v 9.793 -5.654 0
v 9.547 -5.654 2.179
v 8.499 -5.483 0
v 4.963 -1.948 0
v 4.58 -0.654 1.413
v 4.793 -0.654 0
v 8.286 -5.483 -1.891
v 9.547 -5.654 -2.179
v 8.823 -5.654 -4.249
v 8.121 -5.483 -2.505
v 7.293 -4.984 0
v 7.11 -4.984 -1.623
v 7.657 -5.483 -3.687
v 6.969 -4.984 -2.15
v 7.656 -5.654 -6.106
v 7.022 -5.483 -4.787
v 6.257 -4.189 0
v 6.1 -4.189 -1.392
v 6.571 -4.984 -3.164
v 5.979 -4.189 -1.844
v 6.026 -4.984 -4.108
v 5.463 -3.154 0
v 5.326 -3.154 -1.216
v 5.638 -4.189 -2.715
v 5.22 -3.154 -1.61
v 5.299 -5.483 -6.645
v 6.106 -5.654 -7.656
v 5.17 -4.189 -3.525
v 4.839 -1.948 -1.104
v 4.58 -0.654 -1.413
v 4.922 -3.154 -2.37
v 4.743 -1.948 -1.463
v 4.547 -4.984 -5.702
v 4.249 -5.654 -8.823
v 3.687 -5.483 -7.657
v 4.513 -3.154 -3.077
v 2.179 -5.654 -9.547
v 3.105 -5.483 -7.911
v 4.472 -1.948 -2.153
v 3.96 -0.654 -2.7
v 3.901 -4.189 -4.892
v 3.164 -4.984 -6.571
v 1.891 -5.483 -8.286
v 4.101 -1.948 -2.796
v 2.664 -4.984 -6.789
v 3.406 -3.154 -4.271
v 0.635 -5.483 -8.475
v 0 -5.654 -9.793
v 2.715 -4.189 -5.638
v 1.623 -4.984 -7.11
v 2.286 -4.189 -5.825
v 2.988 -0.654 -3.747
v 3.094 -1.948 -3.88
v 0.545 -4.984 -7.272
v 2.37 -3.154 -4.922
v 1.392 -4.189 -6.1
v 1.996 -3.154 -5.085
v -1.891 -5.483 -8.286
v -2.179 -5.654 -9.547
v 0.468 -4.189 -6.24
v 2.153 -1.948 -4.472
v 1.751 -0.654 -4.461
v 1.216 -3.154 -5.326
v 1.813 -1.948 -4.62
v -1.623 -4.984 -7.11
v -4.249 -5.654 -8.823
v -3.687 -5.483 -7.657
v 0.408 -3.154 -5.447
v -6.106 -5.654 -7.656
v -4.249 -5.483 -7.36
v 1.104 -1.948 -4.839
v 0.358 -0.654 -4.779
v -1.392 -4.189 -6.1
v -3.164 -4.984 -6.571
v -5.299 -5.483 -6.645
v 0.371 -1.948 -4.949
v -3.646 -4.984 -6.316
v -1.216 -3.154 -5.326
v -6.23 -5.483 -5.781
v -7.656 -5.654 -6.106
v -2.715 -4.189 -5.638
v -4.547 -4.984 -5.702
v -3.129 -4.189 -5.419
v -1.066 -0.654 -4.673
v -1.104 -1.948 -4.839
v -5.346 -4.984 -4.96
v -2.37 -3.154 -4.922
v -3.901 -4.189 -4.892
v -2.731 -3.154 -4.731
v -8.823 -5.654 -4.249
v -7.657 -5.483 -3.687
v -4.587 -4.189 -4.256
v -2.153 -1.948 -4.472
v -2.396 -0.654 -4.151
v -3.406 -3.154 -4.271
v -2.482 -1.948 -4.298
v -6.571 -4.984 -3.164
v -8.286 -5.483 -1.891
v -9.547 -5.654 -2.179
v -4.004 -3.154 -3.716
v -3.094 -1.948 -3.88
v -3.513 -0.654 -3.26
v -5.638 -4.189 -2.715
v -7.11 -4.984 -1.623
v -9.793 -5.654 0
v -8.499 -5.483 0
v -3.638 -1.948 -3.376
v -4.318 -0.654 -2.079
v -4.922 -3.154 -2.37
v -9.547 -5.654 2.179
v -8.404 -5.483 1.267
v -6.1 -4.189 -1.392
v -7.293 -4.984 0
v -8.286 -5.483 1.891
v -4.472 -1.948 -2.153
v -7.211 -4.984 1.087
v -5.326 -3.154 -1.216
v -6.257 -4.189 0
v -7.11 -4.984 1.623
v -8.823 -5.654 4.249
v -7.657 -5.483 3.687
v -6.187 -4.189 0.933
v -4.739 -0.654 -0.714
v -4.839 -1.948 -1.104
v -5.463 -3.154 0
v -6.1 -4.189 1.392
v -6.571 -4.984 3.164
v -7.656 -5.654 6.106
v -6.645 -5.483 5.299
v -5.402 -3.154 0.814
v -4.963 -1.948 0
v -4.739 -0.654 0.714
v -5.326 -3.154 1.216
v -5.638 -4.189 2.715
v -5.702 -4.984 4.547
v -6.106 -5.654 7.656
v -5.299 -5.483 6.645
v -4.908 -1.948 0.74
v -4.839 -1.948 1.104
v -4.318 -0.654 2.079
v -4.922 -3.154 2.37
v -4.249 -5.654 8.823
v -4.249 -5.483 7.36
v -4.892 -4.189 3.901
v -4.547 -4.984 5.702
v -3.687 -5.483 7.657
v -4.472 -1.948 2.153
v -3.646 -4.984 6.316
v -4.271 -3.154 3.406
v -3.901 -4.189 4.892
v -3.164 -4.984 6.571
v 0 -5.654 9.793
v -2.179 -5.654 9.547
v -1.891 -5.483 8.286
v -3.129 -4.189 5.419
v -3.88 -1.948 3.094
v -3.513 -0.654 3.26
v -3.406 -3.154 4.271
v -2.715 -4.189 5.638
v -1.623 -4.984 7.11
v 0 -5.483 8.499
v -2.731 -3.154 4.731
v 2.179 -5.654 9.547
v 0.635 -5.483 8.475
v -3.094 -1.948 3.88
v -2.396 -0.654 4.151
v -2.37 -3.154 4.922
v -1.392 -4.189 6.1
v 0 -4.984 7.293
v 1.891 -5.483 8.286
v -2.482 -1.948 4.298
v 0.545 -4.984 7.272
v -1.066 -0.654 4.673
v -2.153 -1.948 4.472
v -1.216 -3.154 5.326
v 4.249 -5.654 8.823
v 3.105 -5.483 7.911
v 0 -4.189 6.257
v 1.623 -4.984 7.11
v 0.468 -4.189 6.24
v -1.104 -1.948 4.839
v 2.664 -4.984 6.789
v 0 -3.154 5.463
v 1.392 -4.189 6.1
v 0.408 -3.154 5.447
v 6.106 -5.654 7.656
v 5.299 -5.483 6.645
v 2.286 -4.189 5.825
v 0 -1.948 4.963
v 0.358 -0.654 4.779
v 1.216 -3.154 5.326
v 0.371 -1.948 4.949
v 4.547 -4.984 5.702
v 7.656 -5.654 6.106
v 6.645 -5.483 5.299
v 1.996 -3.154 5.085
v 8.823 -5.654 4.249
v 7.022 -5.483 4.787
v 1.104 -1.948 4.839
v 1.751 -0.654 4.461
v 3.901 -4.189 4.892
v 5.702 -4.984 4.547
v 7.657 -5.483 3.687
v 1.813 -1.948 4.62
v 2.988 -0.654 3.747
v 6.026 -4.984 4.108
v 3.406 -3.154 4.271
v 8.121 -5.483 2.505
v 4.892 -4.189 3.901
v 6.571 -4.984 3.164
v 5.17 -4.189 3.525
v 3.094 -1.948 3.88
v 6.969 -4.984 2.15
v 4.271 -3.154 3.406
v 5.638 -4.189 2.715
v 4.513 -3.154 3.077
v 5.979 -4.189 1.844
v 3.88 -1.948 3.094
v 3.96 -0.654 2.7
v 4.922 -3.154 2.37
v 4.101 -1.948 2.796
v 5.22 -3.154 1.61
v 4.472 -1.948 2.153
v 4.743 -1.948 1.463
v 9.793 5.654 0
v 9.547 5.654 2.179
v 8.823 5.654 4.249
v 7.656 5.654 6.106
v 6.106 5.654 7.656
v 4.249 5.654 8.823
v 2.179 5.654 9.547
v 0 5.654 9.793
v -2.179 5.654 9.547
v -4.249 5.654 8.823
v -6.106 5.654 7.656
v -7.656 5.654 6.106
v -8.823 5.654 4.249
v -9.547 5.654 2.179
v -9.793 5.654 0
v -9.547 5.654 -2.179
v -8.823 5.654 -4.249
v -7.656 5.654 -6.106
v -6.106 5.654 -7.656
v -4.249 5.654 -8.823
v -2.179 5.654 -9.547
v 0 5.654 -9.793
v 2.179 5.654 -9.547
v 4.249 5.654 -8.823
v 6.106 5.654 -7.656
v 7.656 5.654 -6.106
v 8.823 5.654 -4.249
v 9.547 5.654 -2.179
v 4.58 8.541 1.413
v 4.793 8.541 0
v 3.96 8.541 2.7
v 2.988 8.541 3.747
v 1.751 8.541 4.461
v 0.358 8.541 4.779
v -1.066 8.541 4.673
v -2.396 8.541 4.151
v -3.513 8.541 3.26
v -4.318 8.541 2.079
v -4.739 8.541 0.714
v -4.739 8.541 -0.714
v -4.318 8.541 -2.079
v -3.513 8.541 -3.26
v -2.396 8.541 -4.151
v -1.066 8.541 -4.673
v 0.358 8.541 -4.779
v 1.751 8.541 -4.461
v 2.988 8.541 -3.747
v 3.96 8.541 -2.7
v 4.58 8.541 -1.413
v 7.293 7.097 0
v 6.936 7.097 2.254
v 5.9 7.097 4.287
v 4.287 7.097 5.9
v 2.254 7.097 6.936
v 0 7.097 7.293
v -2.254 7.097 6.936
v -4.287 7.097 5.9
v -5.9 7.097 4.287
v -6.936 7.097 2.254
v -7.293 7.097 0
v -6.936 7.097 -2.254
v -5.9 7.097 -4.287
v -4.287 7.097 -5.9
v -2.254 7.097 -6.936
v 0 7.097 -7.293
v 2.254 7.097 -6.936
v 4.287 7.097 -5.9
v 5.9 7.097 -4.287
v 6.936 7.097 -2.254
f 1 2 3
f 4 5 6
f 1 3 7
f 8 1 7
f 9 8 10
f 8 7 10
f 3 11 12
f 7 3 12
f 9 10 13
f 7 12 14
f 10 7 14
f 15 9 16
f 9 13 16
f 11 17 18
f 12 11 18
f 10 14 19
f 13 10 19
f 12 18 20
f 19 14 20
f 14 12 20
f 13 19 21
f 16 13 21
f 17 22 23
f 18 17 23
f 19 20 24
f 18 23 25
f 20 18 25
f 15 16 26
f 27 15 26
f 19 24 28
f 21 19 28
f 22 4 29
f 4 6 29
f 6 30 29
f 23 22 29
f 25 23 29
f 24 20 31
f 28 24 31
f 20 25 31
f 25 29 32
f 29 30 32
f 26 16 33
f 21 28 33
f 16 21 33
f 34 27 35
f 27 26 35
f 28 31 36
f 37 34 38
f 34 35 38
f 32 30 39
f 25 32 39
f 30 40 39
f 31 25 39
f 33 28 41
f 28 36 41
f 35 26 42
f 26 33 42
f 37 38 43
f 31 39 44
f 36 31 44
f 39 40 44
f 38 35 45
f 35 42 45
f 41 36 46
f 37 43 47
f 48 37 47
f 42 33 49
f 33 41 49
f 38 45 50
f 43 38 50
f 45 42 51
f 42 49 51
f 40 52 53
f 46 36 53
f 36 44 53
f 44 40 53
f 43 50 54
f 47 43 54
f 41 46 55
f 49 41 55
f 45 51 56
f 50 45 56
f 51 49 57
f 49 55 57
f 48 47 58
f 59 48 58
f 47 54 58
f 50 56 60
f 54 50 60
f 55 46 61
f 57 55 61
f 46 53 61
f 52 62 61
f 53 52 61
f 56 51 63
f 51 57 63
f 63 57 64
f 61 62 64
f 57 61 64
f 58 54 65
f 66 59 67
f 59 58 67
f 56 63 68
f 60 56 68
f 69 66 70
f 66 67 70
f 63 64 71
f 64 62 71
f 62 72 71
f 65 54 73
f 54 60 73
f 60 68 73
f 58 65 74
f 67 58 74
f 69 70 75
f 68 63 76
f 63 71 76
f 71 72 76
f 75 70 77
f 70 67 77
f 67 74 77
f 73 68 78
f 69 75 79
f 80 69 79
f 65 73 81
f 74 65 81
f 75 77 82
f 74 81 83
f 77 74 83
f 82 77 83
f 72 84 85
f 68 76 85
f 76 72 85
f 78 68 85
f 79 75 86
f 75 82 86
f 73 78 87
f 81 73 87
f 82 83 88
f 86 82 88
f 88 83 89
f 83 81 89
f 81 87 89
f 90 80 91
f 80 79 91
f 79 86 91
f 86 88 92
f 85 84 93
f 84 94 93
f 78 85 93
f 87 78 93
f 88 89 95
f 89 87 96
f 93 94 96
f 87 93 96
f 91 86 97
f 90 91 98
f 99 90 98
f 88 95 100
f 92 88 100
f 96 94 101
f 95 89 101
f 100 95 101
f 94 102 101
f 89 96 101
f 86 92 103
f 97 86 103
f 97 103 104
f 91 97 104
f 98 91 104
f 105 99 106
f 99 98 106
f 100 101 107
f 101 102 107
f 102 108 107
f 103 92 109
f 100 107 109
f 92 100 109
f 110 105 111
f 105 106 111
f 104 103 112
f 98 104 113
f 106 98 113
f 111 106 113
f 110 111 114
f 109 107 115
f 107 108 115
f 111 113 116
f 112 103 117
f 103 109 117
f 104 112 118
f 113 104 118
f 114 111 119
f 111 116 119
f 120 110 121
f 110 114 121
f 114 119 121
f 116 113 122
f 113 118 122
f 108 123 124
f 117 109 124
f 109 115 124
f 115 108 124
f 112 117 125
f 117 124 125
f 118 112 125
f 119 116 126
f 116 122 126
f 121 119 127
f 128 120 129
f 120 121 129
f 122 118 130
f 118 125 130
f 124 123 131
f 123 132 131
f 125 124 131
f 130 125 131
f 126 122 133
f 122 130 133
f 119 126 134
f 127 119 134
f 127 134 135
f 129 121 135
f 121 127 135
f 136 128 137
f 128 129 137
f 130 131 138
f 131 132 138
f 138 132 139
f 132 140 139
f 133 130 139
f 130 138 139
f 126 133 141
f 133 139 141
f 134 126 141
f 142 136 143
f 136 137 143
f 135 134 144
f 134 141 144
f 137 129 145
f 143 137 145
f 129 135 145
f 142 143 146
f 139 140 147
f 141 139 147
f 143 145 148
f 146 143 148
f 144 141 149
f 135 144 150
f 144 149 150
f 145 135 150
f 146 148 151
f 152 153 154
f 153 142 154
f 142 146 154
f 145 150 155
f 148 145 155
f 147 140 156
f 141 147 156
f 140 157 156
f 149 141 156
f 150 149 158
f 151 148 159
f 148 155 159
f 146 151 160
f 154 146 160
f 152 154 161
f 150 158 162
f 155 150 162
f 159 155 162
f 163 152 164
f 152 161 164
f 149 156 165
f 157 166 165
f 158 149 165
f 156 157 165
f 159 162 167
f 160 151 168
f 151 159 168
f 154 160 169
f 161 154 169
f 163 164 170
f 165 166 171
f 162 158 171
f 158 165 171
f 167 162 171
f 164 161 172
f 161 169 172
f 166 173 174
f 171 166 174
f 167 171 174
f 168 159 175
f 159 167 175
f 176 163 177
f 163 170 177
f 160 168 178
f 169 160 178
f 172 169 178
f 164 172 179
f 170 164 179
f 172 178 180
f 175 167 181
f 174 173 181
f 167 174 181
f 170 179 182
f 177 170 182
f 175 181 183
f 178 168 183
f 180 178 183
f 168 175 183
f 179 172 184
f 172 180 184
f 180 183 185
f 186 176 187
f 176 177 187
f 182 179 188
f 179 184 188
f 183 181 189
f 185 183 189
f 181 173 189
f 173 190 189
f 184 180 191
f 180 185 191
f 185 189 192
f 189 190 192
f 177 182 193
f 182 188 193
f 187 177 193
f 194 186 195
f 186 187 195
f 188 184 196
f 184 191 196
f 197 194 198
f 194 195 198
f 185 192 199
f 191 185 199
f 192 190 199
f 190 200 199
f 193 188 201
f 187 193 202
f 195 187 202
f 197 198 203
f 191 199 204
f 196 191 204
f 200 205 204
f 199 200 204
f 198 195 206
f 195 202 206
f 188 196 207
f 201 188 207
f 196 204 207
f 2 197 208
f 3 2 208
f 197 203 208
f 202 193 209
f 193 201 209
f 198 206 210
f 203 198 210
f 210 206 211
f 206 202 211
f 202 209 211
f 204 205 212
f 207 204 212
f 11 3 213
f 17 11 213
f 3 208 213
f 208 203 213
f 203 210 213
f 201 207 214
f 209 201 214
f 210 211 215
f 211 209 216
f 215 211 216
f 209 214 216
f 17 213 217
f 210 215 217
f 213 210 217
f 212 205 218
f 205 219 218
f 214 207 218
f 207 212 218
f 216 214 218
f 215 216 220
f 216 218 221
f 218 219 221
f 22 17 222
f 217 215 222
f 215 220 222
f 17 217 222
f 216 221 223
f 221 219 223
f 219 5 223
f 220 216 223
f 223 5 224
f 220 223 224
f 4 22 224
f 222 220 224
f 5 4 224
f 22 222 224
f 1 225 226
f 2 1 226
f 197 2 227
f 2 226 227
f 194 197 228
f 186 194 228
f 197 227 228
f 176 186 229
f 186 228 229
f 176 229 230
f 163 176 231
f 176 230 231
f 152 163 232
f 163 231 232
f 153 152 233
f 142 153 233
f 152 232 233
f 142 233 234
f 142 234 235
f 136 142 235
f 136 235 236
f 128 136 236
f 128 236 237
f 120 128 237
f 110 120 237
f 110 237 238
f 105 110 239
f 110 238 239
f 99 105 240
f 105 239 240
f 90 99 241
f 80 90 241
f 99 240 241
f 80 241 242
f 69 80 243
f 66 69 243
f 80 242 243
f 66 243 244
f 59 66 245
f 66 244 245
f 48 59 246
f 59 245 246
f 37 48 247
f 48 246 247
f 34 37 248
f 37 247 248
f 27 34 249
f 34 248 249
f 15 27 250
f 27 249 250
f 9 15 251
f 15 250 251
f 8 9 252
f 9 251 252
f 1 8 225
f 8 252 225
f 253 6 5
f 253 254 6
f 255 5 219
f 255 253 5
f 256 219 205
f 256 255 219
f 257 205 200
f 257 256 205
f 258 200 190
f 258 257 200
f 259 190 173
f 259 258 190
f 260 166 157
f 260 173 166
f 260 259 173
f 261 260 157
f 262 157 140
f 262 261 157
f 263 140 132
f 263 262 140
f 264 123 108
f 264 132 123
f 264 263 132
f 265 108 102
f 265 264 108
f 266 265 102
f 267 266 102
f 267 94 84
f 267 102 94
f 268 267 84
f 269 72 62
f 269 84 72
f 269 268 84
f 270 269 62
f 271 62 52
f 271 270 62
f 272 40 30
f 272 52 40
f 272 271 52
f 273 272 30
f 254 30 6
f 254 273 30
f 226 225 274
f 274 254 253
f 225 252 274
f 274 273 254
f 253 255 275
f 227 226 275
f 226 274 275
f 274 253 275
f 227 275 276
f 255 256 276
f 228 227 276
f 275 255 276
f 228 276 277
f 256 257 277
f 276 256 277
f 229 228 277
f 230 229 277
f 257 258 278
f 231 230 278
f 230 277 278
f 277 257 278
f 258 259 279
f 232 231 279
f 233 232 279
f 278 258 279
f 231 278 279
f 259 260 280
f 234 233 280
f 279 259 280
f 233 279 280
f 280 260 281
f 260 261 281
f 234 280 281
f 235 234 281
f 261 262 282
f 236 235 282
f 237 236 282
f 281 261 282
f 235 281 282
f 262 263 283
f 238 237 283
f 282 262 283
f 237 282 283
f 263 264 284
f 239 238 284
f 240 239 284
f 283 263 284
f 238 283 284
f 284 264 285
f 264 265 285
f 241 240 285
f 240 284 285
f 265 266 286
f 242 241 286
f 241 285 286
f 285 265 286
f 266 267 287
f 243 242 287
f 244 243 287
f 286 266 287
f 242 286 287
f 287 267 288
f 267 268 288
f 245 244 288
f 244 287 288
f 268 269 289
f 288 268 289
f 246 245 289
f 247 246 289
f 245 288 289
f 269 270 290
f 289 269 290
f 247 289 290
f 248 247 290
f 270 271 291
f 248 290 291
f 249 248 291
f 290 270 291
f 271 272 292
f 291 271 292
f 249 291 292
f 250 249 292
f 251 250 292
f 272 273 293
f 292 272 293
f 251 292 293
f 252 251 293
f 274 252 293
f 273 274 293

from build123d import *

# Parameters (mm, degrees)
F2_T = -5


# Not quite as in the source:
# - a fillet or chamfer that OpenCascade refuses, or shapes differently, is made with other operations: its cross-section is extruded or revolved along the edge and cut away or added


with BuildPart() as f1:
    # F0 (on Top) → F1 (revolve)
    with BuildSketch(Plane.XY):
        Polygon((0, 11.3076803427), (0, -11.3076803427), (9.7927384347, -5.6538401714), (9.7927384347, 5.6538401714), align=None)
    revolve(axis=Axis((0, 0, 0), (0, -1, 0)))

    # F2
    f2_openings = [f1.faces().sort_by_distance(p)[0] for p in [
        (-4.896369, -8.48076, 0),
        (-4.896369, 8.48076, 0),
    ]]
    offset(amount=F2_T, openings=f2_openings)

    # F3: fillet of radius 5 on 1 edges, made by hand

    # F3_s1 → F3_t2 (revolve, cut)
    with BuildSketch(Plane.XY):
        with BuildLine():
            ThreePointArc((9.7927384347, -5.6538401714), (6.2572045287, -4.1893740773), (4.7927384347, -0.6538401714))
            Line((4.7927384347, -0.6538401714), (4.6927384347, -0.6538401714))
            Line((4.6927384347, -0.6538401714), (4.6927384347, -8.5405915173))
            Line((4.6927384347, -8.5405915173), (4.8427384347, -8.6271940577))
            ThreePointArc((4.8427384347, -8.6271940577), (7.3427384347, -7.1838183847), (9.7927384347, -5.7538401714))
            Line((9.7927384347, -5.7538401714), (9.7927384347, -5.6538401714))
        make_face()
    revolve(axis=Axis((0, -8.5405915173, 0), (0, 1, 0)), mode=Mode.SUBTRACT)


solid = f1.part
